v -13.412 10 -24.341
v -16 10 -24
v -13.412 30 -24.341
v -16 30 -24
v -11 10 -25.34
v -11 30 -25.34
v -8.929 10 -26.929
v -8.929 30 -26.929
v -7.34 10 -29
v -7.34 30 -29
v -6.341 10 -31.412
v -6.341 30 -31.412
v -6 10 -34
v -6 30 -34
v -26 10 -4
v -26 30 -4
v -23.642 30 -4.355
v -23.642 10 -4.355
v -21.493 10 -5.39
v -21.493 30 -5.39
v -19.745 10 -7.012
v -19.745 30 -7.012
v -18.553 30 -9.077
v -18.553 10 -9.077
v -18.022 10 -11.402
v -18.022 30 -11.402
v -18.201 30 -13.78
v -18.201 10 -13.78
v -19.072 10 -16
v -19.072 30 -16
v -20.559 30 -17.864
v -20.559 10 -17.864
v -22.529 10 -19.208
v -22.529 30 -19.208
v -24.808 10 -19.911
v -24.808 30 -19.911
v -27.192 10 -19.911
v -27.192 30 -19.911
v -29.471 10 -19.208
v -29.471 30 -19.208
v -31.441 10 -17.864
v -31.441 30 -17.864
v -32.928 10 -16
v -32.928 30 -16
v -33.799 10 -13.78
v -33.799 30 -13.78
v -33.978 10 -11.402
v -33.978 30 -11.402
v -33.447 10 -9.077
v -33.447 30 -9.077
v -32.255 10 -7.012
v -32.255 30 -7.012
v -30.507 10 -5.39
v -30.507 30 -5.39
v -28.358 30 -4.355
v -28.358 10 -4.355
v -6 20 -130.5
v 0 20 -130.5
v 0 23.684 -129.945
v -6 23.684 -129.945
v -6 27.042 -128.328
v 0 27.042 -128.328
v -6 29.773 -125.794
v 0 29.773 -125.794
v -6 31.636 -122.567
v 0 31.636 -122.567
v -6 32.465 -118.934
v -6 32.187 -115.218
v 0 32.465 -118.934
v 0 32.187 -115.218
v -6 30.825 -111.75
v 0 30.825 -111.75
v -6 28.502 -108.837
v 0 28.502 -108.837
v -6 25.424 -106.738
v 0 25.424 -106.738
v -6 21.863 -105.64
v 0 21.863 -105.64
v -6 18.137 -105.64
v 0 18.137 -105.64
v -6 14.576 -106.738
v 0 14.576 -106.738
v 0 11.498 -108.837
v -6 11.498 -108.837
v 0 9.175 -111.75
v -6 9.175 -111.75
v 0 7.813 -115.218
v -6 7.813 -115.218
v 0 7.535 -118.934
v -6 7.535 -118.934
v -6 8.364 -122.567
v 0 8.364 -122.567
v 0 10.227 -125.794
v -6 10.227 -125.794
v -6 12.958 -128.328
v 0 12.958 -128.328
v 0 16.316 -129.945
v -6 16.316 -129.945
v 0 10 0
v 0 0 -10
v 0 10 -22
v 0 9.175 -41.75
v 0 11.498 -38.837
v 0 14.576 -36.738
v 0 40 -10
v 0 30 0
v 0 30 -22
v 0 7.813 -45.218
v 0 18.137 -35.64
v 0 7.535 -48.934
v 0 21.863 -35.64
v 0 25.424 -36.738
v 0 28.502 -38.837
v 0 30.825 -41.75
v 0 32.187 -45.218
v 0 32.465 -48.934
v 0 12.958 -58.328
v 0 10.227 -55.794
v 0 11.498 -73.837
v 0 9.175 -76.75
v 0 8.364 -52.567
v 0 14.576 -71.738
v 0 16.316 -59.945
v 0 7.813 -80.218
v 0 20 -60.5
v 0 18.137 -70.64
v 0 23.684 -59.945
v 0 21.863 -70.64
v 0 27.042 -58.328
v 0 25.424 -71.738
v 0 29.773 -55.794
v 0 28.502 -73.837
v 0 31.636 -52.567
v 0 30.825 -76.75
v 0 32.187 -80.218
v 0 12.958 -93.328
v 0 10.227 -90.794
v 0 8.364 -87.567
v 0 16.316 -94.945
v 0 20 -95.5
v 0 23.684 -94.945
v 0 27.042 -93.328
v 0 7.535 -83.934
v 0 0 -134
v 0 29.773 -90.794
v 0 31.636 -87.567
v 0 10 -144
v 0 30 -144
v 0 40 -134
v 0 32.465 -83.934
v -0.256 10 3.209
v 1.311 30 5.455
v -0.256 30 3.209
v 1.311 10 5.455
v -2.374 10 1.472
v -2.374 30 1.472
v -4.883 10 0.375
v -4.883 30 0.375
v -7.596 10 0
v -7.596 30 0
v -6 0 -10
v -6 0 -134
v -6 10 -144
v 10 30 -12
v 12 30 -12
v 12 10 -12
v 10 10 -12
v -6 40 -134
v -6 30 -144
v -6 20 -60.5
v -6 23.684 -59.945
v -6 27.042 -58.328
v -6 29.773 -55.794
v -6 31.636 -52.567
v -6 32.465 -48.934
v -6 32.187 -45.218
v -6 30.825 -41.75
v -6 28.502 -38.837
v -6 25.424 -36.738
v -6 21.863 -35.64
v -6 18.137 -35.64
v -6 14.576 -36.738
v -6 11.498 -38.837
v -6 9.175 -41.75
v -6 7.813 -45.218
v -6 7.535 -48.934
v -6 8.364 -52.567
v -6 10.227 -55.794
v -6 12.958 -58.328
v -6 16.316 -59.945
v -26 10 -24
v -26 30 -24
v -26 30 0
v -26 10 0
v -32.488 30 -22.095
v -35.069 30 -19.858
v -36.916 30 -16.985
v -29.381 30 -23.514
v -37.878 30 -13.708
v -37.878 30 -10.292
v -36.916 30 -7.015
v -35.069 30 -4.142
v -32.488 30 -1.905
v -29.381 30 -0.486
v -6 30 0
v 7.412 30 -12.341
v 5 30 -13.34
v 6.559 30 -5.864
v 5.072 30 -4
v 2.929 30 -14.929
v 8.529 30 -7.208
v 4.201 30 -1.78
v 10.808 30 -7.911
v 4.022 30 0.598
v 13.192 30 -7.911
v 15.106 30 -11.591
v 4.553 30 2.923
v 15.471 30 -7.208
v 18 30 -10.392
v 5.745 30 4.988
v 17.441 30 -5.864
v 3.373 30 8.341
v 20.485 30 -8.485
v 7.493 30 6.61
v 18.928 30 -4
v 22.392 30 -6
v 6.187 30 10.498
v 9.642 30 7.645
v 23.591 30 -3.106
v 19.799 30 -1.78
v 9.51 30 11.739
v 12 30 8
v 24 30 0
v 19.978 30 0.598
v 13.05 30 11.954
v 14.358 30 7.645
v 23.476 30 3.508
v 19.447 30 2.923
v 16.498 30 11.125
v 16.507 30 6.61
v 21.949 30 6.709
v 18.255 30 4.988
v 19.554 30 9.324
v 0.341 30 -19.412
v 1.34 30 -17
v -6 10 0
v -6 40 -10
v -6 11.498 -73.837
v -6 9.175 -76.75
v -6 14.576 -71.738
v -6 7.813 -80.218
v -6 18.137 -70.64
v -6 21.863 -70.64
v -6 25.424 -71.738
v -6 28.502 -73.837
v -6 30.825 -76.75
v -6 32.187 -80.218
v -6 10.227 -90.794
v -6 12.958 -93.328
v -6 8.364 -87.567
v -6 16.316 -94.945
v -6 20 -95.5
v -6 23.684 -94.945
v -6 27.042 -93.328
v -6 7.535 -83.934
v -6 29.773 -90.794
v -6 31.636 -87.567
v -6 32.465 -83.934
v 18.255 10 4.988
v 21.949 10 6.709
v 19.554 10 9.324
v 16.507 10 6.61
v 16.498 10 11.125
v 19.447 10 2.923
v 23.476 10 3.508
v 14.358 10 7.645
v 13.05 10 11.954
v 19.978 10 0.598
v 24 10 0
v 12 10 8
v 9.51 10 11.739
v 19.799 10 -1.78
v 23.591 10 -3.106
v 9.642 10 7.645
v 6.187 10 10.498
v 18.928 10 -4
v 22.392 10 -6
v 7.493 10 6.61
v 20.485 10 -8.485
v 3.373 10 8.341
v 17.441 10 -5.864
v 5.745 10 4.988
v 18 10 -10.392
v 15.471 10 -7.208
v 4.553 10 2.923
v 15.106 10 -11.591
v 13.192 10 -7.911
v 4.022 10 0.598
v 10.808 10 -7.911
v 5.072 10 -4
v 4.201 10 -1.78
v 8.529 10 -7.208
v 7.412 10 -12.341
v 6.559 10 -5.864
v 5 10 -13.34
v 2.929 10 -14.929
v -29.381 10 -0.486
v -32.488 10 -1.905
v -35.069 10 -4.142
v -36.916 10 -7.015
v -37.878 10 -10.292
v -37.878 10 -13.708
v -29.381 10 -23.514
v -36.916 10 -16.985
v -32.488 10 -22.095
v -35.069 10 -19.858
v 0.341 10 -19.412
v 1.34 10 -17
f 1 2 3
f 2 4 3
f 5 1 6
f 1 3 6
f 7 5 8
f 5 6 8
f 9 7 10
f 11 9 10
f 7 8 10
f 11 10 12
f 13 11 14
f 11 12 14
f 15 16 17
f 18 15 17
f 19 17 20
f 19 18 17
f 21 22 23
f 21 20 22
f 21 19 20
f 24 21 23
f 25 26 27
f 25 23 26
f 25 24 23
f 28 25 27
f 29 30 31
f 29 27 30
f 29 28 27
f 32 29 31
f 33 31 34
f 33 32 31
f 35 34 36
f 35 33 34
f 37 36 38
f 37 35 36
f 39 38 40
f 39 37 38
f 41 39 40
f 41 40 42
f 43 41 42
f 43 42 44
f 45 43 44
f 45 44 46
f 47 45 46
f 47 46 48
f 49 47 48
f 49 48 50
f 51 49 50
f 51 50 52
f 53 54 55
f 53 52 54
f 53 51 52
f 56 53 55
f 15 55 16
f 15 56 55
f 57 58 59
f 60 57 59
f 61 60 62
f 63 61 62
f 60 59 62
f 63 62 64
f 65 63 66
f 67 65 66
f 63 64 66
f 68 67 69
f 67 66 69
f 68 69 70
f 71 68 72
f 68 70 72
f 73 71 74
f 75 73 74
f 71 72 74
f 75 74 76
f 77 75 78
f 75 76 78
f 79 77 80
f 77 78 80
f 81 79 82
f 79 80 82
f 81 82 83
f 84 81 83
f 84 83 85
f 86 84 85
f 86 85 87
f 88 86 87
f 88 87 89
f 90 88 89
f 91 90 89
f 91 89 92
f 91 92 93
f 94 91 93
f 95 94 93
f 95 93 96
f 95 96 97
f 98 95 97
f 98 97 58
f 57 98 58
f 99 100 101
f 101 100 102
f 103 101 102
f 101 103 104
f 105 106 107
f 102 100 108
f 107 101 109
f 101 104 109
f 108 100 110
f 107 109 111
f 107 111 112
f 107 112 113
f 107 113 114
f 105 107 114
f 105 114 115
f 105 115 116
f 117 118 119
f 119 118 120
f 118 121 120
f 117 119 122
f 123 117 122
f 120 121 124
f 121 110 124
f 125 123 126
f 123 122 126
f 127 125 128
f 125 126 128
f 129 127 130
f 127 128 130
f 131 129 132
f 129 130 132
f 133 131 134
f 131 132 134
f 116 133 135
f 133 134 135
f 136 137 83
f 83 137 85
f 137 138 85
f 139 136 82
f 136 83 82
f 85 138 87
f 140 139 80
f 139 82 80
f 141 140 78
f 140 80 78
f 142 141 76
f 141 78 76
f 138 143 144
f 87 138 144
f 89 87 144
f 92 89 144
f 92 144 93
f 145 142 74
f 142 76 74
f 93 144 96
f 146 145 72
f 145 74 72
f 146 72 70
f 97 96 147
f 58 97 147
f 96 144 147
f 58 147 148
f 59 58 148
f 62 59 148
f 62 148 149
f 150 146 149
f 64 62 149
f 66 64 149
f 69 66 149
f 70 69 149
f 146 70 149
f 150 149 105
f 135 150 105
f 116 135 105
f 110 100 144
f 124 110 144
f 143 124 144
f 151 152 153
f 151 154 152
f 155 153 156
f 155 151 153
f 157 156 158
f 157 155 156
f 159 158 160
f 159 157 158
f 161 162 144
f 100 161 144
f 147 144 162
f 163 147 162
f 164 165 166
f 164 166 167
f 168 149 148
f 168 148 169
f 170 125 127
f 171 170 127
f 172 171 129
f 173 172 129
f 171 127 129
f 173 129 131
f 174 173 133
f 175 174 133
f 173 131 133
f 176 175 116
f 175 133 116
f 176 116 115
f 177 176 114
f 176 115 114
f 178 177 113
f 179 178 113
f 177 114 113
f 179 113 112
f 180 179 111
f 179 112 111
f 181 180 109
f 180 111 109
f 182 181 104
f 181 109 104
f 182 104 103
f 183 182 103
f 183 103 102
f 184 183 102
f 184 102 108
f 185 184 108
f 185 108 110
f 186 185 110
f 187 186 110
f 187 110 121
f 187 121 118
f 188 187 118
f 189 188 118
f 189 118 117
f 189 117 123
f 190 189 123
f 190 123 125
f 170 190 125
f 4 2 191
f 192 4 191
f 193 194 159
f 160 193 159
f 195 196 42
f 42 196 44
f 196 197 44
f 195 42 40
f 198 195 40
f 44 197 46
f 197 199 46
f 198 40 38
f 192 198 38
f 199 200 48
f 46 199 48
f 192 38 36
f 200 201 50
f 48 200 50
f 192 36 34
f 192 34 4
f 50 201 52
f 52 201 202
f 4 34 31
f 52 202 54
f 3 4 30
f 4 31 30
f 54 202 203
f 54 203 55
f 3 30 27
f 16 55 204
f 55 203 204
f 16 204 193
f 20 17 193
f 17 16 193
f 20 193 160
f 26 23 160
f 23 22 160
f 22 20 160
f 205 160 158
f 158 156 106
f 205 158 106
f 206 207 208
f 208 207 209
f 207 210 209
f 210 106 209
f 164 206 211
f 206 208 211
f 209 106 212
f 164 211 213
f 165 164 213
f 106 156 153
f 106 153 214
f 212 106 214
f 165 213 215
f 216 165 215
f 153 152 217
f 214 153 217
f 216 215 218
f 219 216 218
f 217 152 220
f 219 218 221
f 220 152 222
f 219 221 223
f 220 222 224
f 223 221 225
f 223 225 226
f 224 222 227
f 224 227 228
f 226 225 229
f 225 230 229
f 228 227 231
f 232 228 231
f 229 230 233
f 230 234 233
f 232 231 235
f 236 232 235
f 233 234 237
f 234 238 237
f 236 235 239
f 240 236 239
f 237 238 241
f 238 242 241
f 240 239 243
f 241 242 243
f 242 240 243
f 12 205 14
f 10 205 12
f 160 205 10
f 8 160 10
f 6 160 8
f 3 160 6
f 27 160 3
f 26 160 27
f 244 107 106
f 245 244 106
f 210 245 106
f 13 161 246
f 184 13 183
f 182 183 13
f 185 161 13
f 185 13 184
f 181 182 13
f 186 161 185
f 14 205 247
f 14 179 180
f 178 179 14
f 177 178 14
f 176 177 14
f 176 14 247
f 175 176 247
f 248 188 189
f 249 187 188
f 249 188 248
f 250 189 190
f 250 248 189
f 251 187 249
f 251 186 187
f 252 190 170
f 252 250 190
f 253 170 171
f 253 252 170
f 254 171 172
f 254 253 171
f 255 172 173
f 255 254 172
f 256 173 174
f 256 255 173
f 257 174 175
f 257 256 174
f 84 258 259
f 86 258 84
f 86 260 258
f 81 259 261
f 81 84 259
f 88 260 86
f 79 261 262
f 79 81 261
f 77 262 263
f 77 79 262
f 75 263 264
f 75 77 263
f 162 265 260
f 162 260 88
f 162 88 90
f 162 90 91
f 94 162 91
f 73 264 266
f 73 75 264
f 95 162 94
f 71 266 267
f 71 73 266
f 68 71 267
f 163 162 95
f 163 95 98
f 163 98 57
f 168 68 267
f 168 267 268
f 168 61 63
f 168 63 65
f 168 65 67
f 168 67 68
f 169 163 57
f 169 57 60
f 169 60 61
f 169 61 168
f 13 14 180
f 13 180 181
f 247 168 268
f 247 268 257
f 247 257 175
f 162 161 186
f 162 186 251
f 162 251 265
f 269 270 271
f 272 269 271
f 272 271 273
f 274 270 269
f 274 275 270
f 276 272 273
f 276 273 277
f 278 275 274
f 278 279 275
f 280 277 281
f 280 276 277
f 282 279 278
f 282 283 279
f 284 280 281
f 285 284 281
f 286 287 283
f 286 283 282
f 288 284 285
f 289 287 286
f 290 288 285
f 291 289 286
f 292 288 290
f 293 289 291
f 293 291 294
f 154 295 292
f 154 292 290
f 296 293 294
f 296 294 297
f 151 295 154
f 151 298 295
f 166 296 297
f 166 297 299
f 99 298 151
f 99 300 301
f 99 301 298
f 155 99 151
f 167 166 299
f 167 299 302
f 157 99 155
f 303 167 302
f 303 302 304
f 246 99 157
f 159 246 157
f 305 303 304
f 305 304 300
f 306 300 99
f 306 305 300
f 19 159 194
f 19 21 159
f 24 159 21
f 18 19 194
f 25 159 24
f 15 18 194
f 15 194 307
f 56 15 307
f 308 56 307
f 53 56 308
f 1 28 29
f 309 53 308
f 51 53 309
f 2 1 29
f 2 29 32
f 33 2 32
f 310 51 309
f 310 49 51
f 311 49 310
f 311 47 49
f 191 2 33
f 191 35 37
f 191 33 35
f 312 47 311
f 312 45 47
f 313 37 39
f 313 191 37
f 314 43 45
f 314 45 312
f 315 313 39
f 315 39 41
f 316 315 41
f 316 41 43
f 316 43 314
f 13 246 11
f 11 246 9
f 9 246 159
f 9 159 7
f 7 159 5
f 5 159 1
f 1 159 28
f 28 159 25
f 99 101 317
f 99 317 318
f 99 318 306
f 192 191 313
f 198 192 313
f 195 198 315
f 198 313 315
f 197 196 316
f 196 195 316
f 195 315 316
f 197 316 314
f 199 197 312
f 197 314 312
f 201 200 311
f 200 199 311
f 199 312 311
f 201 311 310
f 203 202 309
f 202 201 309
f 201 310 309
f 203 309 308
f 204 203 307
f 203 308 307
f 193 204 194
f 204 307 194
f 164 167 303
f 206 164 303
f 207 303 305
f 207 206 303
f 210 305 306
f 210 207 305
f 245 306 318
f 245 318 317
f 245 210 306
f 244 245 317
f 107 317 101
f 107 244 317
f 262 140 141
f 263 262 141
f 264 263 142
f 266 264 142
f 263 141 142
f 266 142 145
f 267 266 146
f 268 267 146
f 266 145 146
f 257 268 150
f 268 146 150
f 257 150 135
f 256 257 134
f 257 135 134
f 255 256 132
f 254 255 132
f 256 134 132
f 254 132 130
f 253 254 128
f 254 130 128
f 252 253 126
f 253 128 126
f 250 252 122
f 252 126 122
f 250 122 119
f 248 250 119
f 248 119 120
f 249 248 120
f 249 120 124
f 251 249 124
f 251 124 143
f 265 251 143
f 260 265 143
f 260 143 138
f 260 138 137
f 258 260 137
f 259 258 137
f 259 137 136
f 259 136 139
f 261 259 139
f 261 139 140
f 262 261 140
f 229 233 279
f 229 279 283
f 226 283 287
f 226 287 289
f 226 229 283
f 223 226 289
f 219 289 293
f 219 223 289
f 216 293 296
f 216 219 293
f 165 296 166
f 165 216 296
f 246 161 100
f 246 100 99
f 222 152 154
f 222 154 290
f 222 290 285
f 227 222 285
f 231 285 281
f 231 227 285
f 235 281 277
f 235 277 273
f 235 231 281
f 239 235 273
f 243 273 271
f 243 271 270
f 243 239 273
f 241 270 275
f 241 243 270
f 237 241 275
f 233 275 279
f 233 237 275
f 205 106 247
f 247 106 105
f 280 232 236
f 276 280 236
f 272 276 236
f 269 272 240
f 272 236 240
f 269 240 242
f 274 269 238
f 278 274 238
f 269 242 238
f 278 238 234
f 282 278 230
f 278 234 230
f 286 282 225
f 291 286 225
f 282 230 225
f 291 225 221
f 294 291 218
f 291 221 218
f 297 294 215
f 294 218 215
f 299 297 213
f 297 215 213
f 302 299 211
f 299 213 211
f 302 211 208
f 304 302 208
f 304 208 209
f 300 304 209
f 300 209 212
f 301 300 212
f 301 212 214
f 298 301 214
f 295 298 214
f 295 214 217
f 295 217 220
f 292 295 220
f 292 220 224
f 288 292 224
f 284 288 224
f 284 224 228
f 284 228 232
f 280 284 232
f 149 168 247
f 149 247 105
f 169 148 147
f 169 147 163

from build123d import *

# Parameters (mm, degrees)
SKETCH1_R           = 8
BOSS_EXTRUDE1_DEPTH = 40
CHAMFER1_SIZE       = 10
SKETCH2_R           = 8
BOSS_EXTRUDE2_DEPTH = 40
CUT_EXTRUDE2_REACH  = 134.076
SKETCH4_W           = 40
SKETCH4_H           = 10
FILLET4_R           = 10
CUT_EXTRUDE9_REACH  = 154.84
CUT_EXTRUDE10_REACH = 153.921
FILLET5_R           = 10
CUT_EXTRUDE11_REACH = 156.208
SKETCH15_R          = 12.5


with BuildPart() as part:
    # Sketch1 → Boss-Extrude1 (new body)
    with BuildSketch(Plane(origin=(0, 0, 0), x_dir=(1, 0, 0), z_dir=(0, 1, 0))):
        with BuildLine():
            Line((0, 0), (0, 144))
            Line((0, 144), (-6, 144))
            Line((-6, 144), (-6, 24))
            Line((-6, 24), (-26, 24))
            ThreePointArc((-26, 24), (-38, 12), (-26, 0))
            Line((-26, 0), (0, 0))
        make_face()
        with Locations(Location((-26, 12, 0), (0, 0, 270))):
            Circle(SKETCH1_R, mode=Mode.SUBTRACT)
    extrude(amount=BOSS_EXTRUDE1_DEPTH)

    # Chamfer1
    chamfer1_edges = [part.edges().sort_by_distance(p)[0] for p in [
        (-3, 40, -144),
        (-3, 0, -144),
    ]]
    chamfer(chamfer1_edges, length=CHAMFER1_SIZE)

    # Sketch2 → Boss-Extrude2 (add, through all)
    with BuildSketch(Plane(origin=(0, 40, 0), x_dir=(1, 0, 0), z_dir=(0, 1, 0))):
        with BuildLine():
            ThreePointArc((0, 0), (12, -12), (24, 0))
            Line((24, 0), (24, 24))
            Line((24, 24), (0, 24))
            Line((0, 24), (0, 0))
        make_face()
        with Locations(Location((12, 0, 0), (0, 0, 270))):
            Circle(SKETCH2_R, mode=Mode.SUBTRACT)
    extrude(amount=-BOSS_EXTRUDE2_DEPTH)

    # Sketch4 → Cut-Extrude2 (cut, up to next)
    with BuildSketch(Plane(origin=(0, 0, -24), x_dir=(-1, 0, 0), z_dir=(0, 0, -1)), mode=Mode.PRIVATE) as cut_extrude2_sk1:
        with Locations((26, 35)):
            Rectangle(SKETCH4_W, SKETCH4_H)
    cut_extrude2_tool1 = extrude(cut_extrude2_sk1.sketch, amount=-CUT_EXTRUDE2_REACH, mode=Mode.PRIVATE) & part.part
    # Sketch4 → Cut-Extrude2 (cut, up to next)
    with BuildSketch(Plane(origin=(0, 0, -24), x_dir=(-1, 0, 0), z_dir=(0, 0, -1)), mode=Mode.PRIVATE) as cut_extrude2_sk2:
        with Locations((26, 5)):
            Rectangle(SKETCH4_W, SKETCH4_H)
    cut_extrude2_tool2 = extrude(cut_extrude2_sk2.sketch, amount=-CUT_EXTRUDE2_REACH, mode=Mode.PRIVATE) & part.part
    # Sketch4 → Cut-Extrude2 (cut, up to next)
    with BuildSketch(Plane(origin=(0, 0, -24), x_dir=(-1, 0, 0), z_dir=(0, 0, -1)), mode=Mode.PRIVATE) as cut_extrude2_sk3:
        with Locations((-20, 5)):
            Rectangle(SKETCH4_W, SKETCH4_H)
    cut_extrude2_tool3 = extrude(cut_extrude2_sk3.sketch, amount=-CUT_EXTRUDE2_REACH, mode=Mode.PRIVATE) & part.part
    # Sketch4 → Cut-Extrude2 (cut, up to next)
    with BuildSketch(Plane(origin=(0, 0, -24), x_dir=(-1, 0, 0), z_dir=(0, 0, -1)), mode=Mode.PRIVATE) as cut_extrude2_sk4:
        with Locations((-20, 35)):
            Rectangle(SKETCH4_W, SKETCH4_H)
    cut_extrude2_tool4 = extrude(cut_extrude2_sk4.sketch, amount=-CUT_EXTRUDE2_REACH, mode=Mode.PRIVATE) & part.part
    add(cut_extrude2_tool1.solids().sort_by_distance((-26, 35, -24))[0], mode=Mode.SUBTRACT)
    add(cut_extrude2_tool2.solids().sort_by_distance((-26, 5, -24))[0], mode=Mode.SUBTRACT)
    add(cut_extrude2_tool3.solids().sort_by_distance((20, 5, -24))[0], mode=Mode.SUBTRACT)
    add(cut_extrude2_tool4.solids().sort_by_distance((20, 35, -24))[0], mode=Mode.SUBTRACT)

    # Fillet4
    fillet4_edges = [part.edges().sort_by_distance(p)[0] for p in [
        (-6, 20, -24),
    ]]
    fillet(fillet4_edges, radius=FILLET4_R)

    # Sketch13 → Cut-Extrude9 (cut, up to next)
    with BuildSketch(Plane.ZY.offset(6), mode=Mode.PRIVATE) as cut_extrude9_sk1:
        Polygon((0, 30), (-10, 40), (0, 40), align=None)
    cut_extrude9_tool1 = extrude(cut_extrude9_sk1.sketch, amount=-CUT_EXTRUDE9_REACH, mode=Mode.PRIVATE) & part.part
    # Sketch13 → Cut-Extrude9 (cut, up to next)
    with BuildSketch(Plane.ZY.offset(6), mode=Mode.PRIVATE) as cut_extrude9_sk2:
        Polygon((0, 10), (0, 0), (-10, 0), align=None)
    cut_extrude9_tool2 = extrude(cut_extrude9_sk2.sketch, amount=-CUT_EXTRUDE9_REACH, mode=Mode.PRIVATE) & part.part
    add(cut_extrude9_tool1.solids().sort_by_distance((-6, 36.666667, -3.333333))[0], mode=Mode.SUBTRACT)
    add(cut_extrude9_tool2.solids().sort_by_distance((-6, 3.333333, -3.333333))[0], mode=Mode.SUBTRACT)

    # Sketch14 → Cut-Extrude10 (cut, up to next)
    with BuildSketch(Plane(origin=(0, 30, 0), x_dir=(1, 0, 0), z_dir=(0, 1, 0)), mode=Mode.PRIVATE) as cut_extrude10_sk1:
        with BuildLine():
            Line((12, 12), (0, 12))
            Line((0, 12), (0, 24))
            Line((0, 24), (24, 24))
            Line((24, 24), (24, 0))
            ThreePointArc((24, 0), (20.485281374, 8.485281374), (12, 12))
        make_face()
    cut_extrude10_tool1 = extrude(cut_extrude10_sk1.sketch, amount=-CUT_EXTRUDE10_REACH, mode=Mode.PRIVATE) & part.part
    add(cut_extrude10_tool1.solids().sort_by_distance((12.903097, 30, -17.158841))[0], mode=Mode.SUBTRACT)

    # Fillet5
    # the kernel refuses this fillet: 10 mm, written as the material it adds along each edge
    with BuildSketch(Plane(origin=(0, 30, -12), x_dir=(0, 0, -1), z_dir=(0, -1, 0))) as fillet5_piece_1:
        with BuildLine():
            CenterArc((FILLET5_R, FILLET5_R), FILLET5_R, 180, 90)
            Line((0, FILLET5_R), (0, 0))
            Line((0, 0), (FILLET5_R, 0))
        make_face()
    extrude(amount=20)
    with BuildSketch(Plane(origin=(0, 10, 0), x_dir=(-1, 0, 0), z_dir=(0, 1, 0))) as fillet5_piece_2_section:
        with BuildLine():
            CenterArc((7.595917942, 10), FILLET5_R, 207.035691789, 62.964308211)
            ThreePointArc((-1.311317486, 5.454545455), (-0.332434055, 2.804978595), (0, 0))
            Line((0, 0), (7.595917942, 0))
        make_face()
    fillet5_piece_2 = extrude(amount=20, mode=Mode.PRIVATE)
    fillet5_piece_2 = split(fillet5_piece_2, bisect_by=Plane(origin=(-0.444204422, 11.816695322, 1.816695322), z_dir=(0, -0.7071067811865475, 0.7071067811865476)), keep=Keep.TOP, mode=Mode.PRIVATE)
    add(fillet5_piece_2)
    with BuildSketch(Plane(origin=(0, 10, 0), x_dir=(-1, 0, 0), z_dir=(0, 1, 0))) as fillet5_piece_3_section:
        with BuildLine():
            CenterArc((7.595917942, 10), FILLET5_R, 207.035691789, 62.964308211)
            ThreePointArc((-1.311317486, 5.454545455), (-0.332434055, 2.804978595), (0, 0))
            Line((0, 0), (7.595917942, 0))
        make_face()
    fillet5_piece_3 = extrude(amount=20, mode=Mode.PRIVATE)
    fillet5_piece_3 = split(fillet5_piece_3, bisect_by=Plane(origin=(-1.853866484, 24.485517863, 5.514482137), z_dir=(0, -0.7071067811865481, -0.707106781186547)), keep=Keep.TOP, mode=Mode.PRIVATE)
    fillet5_piece_3 = split(fillet5_piece_3, bisect_by=Plane(origin=(-1.853866484, 15.514482137, 5.514482137), z_dir=(0, 0.7071067811865475, -0.7071067811865476)), keep=Keep.TOP, mode=Mode.PRIVATE)
    add(fillet5_piece_3)
    with BuildSketch(Plane(origin=(0, 10, 0), x_dir=(-1, 0, 0), z_dir=(0, 1, 0))) as fillet5_piece_4_section:
        with BuildLine():
            CenterArc((7.595917942, 10), FILLET5_R, 207.035691789, 62.964308211)
            ThreePointArc((-1.311317486, 5.454545455), (-0.332434055, 2.804978595), (0, 0))
            Line((0, 0), (7.595917942, 0))
        make_face()
    fillet5_piece_4 = extrude(amount=20, mode=Mode.PRIVATE)
    fillet5_piece_4 = split(fillet5_piece_4, bisect_by=Plane(origin=(-0.444204422, 28.183304678, 1.816695322), z_dir=(0, 0.7071067811865481, 0.707106781186547)), keep=Keep.TOP, mode=Mode.PRIVATE)
    add(fillet5_piece_4)

    # Sketch15 → Cut-Extrude11 (cut, up to next)
    with BuildSketch(Plane(origin=(0, 0, 0), x_dir=(0, 0, -1), z_dir=(1, 0, 0)), mode=Mode.PRIVATE) as cut_extrude11_sk1:
        with Locations((83, 20)):
            Circle(SKETCH15_R)
    cut_extrude11_tool1 = extrude(cut_extrude11_sk1.sketch, amount=-CUT_EXTRUDE11_REACH, mode=Mode.PRIVATE) & part.part
    # Sketch15 → Cut-Extrude11 (cut, up to next)
    with BuildSketch(Plane(origin=(0, 0, 0), x_dir=(0, 0, -1), z_dir=(1, 0, 0)), mode=Mode.PRIVATE) as cut_extrude11_sk2:
        with Locations((118, 20)):
            Circle(SKETCH15_R)
    cut_extrude11_tool2 = extrude(cut_extrude11_sk2.sketch, amount=-CUT_EXTRUDE11_REACH, mode=Mode.PRIVATE) & part.part
    # Sketch15 → Cut-Extrude11 (cut, up to next)
    with BuildSketch(Plane(origin=(0, 0, 0), x_dir=(0, 0, -1), z_dir=(1, 0, 0)), mode=Mode.PRIVATE) as cut_extrude11_sk3:
        with Locations((48, 20)):
            Circle(SKETCH15_R)
    cut_extrude11_tool3 = extrude(cut_extrude11_sk3.sketch, amount=-CUT_EXTRUDE11_REACH, mode=Mode.PRIVATE) & part.part
    add(cut_extrude11_tool1.solids().sort_by_distance((0, 20, -83))[0], mode=Mode.SUBTRACT)
    add(cut_extrude11_tool2.solids().sort_by_distance((0, 20, -118))[0], mode=Mode.SUBTRACT)
    add(cut_extrude11_tool3.solids().sort_by_distance((0, 20, -48))[0], mode=Mode.SUBTRACT)


solid = part.part
